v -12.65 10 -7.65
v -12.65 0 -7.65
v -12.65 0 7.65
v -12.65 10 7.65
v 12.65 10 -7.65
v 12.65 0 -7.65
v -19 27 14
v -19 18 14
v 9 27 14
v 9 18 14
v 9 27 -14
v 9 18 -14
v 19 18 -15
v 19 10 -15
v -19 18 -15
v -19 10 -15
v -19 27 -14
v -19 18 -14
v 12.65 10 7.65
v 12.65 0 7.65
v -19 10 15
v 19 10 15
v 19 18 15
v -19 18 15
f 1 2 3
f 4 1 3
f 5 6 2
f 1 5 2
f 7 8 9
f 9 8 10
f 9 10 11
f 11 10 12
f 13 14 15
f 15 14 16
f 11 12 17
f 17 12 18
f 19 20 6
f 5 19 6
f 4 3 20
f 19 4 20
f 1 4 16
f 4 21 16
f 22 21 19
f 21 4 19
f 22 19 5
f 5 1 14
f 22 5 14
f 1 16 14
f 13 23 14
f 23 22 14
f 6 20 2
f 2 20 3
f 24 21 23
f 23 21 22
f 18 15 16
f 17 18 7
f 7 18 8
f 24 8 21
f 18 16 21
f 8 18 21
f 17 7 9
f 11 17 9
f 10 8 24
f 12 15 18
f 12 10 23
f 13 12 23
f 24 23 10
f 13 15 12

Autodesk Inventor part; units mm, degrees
ref_plane "YZ Plane" through (0, 0, 0) normal (1, 0, 0) x (0, 1, 0)
ref_plane "XZ Plane" through (0, 0, 0) normal (0, 1, 0) x (-1, 0, 0)
ref_plane "XY Plane" through (0, 0, 0) normal (0, 0, 1) x (1, 0, 0)
sketch "Sketch1" plane through (0, 0, 0) normal (0, 1, 0) x (-1, 0, 0)
  line L0 (12.65, 7.65) -> (-12.65, 7.65)
  line L1 (-12.65, 7.65) -> (-12.65, -7.65)
  line L2 (-12.65, -7.65) -> (12.65, -7.65)
  line L3 (12.65, -7.65) -> (12.65, 7.65)
  point P0 (0, 0)
  point P1 (0, 7.65)
  point P2 (12.65, 0)
  dimension "d0" = 15.3
  dimension "d1" = 25.3
extrude "Extrusion1" add sketch "Sketch1" along normal blind 10
sketch "Sketch2" plane through (0, 10, 0) normal (0, 1, 0) x (1, 0, 0)
  line L0 (-12.65, -7.65) -> (12.65, -7.65) projected
  line L1 (12.65, -7.65) -> (12.65, 7.65) projected
  line L2 (12.65, 7.65) -> (-12.65, 7.65) projected
  line L3 (-12.65, 7.65) -> (-12.65, -7.65) projected
  line L4 (19, 15) -> (-19, 15)
  line L5 (-19, 15) -> (-19, -15)
  line L6 (-19, -15) -> (19, -15)
  line L7 (19, -15) -> (19, 15)
  point P0 (0, 0)
  point P1 (19, 0)
  point P2 (0, 15)
  dimension "d4" = 30
  dimension "d5" = 38
extrude "Extrusion2" add sketch "Sketch2" along normal blind 8 contours L3 L2 L1 L0 | L7 L6 L5 L4
sketch "Sketch3" plane through (0, 18, 0) normal (0, 1, 0) x (1, 0, 0)
  line L0 (19, 15) -> (-19, 15) projected
  line L1 (-19, 15) -> (-19, -15) projected
  line L2 (-19, -15) -> (19, -15) projected
  line L3 (19, -15) -> (19, 15) projected
  line L4 (-19, -14) -> (9, -14)
  line L5 (9, -14) -> (9, 14)
  line L6 (9, 14) -> (-19, 14)
  line L7 (-19, 14) -> (-19, -14)
  line L8 (-19, -14) -> (-19, 0) construction
  line L9 (-19, 0) -> (9, 0) construction
  point P0 (0, 0)
  point P1 (-19, 0)
  point P2 (-5, 0)
  dimension "d8" = 28
  dimension "d9" = 28
  dimension "d10" = 14
extrude "Extrusion3" add sketch "Sketch3" along normal blind 9 contours L6 L5 L4 L1
properties part number "Modulo"
